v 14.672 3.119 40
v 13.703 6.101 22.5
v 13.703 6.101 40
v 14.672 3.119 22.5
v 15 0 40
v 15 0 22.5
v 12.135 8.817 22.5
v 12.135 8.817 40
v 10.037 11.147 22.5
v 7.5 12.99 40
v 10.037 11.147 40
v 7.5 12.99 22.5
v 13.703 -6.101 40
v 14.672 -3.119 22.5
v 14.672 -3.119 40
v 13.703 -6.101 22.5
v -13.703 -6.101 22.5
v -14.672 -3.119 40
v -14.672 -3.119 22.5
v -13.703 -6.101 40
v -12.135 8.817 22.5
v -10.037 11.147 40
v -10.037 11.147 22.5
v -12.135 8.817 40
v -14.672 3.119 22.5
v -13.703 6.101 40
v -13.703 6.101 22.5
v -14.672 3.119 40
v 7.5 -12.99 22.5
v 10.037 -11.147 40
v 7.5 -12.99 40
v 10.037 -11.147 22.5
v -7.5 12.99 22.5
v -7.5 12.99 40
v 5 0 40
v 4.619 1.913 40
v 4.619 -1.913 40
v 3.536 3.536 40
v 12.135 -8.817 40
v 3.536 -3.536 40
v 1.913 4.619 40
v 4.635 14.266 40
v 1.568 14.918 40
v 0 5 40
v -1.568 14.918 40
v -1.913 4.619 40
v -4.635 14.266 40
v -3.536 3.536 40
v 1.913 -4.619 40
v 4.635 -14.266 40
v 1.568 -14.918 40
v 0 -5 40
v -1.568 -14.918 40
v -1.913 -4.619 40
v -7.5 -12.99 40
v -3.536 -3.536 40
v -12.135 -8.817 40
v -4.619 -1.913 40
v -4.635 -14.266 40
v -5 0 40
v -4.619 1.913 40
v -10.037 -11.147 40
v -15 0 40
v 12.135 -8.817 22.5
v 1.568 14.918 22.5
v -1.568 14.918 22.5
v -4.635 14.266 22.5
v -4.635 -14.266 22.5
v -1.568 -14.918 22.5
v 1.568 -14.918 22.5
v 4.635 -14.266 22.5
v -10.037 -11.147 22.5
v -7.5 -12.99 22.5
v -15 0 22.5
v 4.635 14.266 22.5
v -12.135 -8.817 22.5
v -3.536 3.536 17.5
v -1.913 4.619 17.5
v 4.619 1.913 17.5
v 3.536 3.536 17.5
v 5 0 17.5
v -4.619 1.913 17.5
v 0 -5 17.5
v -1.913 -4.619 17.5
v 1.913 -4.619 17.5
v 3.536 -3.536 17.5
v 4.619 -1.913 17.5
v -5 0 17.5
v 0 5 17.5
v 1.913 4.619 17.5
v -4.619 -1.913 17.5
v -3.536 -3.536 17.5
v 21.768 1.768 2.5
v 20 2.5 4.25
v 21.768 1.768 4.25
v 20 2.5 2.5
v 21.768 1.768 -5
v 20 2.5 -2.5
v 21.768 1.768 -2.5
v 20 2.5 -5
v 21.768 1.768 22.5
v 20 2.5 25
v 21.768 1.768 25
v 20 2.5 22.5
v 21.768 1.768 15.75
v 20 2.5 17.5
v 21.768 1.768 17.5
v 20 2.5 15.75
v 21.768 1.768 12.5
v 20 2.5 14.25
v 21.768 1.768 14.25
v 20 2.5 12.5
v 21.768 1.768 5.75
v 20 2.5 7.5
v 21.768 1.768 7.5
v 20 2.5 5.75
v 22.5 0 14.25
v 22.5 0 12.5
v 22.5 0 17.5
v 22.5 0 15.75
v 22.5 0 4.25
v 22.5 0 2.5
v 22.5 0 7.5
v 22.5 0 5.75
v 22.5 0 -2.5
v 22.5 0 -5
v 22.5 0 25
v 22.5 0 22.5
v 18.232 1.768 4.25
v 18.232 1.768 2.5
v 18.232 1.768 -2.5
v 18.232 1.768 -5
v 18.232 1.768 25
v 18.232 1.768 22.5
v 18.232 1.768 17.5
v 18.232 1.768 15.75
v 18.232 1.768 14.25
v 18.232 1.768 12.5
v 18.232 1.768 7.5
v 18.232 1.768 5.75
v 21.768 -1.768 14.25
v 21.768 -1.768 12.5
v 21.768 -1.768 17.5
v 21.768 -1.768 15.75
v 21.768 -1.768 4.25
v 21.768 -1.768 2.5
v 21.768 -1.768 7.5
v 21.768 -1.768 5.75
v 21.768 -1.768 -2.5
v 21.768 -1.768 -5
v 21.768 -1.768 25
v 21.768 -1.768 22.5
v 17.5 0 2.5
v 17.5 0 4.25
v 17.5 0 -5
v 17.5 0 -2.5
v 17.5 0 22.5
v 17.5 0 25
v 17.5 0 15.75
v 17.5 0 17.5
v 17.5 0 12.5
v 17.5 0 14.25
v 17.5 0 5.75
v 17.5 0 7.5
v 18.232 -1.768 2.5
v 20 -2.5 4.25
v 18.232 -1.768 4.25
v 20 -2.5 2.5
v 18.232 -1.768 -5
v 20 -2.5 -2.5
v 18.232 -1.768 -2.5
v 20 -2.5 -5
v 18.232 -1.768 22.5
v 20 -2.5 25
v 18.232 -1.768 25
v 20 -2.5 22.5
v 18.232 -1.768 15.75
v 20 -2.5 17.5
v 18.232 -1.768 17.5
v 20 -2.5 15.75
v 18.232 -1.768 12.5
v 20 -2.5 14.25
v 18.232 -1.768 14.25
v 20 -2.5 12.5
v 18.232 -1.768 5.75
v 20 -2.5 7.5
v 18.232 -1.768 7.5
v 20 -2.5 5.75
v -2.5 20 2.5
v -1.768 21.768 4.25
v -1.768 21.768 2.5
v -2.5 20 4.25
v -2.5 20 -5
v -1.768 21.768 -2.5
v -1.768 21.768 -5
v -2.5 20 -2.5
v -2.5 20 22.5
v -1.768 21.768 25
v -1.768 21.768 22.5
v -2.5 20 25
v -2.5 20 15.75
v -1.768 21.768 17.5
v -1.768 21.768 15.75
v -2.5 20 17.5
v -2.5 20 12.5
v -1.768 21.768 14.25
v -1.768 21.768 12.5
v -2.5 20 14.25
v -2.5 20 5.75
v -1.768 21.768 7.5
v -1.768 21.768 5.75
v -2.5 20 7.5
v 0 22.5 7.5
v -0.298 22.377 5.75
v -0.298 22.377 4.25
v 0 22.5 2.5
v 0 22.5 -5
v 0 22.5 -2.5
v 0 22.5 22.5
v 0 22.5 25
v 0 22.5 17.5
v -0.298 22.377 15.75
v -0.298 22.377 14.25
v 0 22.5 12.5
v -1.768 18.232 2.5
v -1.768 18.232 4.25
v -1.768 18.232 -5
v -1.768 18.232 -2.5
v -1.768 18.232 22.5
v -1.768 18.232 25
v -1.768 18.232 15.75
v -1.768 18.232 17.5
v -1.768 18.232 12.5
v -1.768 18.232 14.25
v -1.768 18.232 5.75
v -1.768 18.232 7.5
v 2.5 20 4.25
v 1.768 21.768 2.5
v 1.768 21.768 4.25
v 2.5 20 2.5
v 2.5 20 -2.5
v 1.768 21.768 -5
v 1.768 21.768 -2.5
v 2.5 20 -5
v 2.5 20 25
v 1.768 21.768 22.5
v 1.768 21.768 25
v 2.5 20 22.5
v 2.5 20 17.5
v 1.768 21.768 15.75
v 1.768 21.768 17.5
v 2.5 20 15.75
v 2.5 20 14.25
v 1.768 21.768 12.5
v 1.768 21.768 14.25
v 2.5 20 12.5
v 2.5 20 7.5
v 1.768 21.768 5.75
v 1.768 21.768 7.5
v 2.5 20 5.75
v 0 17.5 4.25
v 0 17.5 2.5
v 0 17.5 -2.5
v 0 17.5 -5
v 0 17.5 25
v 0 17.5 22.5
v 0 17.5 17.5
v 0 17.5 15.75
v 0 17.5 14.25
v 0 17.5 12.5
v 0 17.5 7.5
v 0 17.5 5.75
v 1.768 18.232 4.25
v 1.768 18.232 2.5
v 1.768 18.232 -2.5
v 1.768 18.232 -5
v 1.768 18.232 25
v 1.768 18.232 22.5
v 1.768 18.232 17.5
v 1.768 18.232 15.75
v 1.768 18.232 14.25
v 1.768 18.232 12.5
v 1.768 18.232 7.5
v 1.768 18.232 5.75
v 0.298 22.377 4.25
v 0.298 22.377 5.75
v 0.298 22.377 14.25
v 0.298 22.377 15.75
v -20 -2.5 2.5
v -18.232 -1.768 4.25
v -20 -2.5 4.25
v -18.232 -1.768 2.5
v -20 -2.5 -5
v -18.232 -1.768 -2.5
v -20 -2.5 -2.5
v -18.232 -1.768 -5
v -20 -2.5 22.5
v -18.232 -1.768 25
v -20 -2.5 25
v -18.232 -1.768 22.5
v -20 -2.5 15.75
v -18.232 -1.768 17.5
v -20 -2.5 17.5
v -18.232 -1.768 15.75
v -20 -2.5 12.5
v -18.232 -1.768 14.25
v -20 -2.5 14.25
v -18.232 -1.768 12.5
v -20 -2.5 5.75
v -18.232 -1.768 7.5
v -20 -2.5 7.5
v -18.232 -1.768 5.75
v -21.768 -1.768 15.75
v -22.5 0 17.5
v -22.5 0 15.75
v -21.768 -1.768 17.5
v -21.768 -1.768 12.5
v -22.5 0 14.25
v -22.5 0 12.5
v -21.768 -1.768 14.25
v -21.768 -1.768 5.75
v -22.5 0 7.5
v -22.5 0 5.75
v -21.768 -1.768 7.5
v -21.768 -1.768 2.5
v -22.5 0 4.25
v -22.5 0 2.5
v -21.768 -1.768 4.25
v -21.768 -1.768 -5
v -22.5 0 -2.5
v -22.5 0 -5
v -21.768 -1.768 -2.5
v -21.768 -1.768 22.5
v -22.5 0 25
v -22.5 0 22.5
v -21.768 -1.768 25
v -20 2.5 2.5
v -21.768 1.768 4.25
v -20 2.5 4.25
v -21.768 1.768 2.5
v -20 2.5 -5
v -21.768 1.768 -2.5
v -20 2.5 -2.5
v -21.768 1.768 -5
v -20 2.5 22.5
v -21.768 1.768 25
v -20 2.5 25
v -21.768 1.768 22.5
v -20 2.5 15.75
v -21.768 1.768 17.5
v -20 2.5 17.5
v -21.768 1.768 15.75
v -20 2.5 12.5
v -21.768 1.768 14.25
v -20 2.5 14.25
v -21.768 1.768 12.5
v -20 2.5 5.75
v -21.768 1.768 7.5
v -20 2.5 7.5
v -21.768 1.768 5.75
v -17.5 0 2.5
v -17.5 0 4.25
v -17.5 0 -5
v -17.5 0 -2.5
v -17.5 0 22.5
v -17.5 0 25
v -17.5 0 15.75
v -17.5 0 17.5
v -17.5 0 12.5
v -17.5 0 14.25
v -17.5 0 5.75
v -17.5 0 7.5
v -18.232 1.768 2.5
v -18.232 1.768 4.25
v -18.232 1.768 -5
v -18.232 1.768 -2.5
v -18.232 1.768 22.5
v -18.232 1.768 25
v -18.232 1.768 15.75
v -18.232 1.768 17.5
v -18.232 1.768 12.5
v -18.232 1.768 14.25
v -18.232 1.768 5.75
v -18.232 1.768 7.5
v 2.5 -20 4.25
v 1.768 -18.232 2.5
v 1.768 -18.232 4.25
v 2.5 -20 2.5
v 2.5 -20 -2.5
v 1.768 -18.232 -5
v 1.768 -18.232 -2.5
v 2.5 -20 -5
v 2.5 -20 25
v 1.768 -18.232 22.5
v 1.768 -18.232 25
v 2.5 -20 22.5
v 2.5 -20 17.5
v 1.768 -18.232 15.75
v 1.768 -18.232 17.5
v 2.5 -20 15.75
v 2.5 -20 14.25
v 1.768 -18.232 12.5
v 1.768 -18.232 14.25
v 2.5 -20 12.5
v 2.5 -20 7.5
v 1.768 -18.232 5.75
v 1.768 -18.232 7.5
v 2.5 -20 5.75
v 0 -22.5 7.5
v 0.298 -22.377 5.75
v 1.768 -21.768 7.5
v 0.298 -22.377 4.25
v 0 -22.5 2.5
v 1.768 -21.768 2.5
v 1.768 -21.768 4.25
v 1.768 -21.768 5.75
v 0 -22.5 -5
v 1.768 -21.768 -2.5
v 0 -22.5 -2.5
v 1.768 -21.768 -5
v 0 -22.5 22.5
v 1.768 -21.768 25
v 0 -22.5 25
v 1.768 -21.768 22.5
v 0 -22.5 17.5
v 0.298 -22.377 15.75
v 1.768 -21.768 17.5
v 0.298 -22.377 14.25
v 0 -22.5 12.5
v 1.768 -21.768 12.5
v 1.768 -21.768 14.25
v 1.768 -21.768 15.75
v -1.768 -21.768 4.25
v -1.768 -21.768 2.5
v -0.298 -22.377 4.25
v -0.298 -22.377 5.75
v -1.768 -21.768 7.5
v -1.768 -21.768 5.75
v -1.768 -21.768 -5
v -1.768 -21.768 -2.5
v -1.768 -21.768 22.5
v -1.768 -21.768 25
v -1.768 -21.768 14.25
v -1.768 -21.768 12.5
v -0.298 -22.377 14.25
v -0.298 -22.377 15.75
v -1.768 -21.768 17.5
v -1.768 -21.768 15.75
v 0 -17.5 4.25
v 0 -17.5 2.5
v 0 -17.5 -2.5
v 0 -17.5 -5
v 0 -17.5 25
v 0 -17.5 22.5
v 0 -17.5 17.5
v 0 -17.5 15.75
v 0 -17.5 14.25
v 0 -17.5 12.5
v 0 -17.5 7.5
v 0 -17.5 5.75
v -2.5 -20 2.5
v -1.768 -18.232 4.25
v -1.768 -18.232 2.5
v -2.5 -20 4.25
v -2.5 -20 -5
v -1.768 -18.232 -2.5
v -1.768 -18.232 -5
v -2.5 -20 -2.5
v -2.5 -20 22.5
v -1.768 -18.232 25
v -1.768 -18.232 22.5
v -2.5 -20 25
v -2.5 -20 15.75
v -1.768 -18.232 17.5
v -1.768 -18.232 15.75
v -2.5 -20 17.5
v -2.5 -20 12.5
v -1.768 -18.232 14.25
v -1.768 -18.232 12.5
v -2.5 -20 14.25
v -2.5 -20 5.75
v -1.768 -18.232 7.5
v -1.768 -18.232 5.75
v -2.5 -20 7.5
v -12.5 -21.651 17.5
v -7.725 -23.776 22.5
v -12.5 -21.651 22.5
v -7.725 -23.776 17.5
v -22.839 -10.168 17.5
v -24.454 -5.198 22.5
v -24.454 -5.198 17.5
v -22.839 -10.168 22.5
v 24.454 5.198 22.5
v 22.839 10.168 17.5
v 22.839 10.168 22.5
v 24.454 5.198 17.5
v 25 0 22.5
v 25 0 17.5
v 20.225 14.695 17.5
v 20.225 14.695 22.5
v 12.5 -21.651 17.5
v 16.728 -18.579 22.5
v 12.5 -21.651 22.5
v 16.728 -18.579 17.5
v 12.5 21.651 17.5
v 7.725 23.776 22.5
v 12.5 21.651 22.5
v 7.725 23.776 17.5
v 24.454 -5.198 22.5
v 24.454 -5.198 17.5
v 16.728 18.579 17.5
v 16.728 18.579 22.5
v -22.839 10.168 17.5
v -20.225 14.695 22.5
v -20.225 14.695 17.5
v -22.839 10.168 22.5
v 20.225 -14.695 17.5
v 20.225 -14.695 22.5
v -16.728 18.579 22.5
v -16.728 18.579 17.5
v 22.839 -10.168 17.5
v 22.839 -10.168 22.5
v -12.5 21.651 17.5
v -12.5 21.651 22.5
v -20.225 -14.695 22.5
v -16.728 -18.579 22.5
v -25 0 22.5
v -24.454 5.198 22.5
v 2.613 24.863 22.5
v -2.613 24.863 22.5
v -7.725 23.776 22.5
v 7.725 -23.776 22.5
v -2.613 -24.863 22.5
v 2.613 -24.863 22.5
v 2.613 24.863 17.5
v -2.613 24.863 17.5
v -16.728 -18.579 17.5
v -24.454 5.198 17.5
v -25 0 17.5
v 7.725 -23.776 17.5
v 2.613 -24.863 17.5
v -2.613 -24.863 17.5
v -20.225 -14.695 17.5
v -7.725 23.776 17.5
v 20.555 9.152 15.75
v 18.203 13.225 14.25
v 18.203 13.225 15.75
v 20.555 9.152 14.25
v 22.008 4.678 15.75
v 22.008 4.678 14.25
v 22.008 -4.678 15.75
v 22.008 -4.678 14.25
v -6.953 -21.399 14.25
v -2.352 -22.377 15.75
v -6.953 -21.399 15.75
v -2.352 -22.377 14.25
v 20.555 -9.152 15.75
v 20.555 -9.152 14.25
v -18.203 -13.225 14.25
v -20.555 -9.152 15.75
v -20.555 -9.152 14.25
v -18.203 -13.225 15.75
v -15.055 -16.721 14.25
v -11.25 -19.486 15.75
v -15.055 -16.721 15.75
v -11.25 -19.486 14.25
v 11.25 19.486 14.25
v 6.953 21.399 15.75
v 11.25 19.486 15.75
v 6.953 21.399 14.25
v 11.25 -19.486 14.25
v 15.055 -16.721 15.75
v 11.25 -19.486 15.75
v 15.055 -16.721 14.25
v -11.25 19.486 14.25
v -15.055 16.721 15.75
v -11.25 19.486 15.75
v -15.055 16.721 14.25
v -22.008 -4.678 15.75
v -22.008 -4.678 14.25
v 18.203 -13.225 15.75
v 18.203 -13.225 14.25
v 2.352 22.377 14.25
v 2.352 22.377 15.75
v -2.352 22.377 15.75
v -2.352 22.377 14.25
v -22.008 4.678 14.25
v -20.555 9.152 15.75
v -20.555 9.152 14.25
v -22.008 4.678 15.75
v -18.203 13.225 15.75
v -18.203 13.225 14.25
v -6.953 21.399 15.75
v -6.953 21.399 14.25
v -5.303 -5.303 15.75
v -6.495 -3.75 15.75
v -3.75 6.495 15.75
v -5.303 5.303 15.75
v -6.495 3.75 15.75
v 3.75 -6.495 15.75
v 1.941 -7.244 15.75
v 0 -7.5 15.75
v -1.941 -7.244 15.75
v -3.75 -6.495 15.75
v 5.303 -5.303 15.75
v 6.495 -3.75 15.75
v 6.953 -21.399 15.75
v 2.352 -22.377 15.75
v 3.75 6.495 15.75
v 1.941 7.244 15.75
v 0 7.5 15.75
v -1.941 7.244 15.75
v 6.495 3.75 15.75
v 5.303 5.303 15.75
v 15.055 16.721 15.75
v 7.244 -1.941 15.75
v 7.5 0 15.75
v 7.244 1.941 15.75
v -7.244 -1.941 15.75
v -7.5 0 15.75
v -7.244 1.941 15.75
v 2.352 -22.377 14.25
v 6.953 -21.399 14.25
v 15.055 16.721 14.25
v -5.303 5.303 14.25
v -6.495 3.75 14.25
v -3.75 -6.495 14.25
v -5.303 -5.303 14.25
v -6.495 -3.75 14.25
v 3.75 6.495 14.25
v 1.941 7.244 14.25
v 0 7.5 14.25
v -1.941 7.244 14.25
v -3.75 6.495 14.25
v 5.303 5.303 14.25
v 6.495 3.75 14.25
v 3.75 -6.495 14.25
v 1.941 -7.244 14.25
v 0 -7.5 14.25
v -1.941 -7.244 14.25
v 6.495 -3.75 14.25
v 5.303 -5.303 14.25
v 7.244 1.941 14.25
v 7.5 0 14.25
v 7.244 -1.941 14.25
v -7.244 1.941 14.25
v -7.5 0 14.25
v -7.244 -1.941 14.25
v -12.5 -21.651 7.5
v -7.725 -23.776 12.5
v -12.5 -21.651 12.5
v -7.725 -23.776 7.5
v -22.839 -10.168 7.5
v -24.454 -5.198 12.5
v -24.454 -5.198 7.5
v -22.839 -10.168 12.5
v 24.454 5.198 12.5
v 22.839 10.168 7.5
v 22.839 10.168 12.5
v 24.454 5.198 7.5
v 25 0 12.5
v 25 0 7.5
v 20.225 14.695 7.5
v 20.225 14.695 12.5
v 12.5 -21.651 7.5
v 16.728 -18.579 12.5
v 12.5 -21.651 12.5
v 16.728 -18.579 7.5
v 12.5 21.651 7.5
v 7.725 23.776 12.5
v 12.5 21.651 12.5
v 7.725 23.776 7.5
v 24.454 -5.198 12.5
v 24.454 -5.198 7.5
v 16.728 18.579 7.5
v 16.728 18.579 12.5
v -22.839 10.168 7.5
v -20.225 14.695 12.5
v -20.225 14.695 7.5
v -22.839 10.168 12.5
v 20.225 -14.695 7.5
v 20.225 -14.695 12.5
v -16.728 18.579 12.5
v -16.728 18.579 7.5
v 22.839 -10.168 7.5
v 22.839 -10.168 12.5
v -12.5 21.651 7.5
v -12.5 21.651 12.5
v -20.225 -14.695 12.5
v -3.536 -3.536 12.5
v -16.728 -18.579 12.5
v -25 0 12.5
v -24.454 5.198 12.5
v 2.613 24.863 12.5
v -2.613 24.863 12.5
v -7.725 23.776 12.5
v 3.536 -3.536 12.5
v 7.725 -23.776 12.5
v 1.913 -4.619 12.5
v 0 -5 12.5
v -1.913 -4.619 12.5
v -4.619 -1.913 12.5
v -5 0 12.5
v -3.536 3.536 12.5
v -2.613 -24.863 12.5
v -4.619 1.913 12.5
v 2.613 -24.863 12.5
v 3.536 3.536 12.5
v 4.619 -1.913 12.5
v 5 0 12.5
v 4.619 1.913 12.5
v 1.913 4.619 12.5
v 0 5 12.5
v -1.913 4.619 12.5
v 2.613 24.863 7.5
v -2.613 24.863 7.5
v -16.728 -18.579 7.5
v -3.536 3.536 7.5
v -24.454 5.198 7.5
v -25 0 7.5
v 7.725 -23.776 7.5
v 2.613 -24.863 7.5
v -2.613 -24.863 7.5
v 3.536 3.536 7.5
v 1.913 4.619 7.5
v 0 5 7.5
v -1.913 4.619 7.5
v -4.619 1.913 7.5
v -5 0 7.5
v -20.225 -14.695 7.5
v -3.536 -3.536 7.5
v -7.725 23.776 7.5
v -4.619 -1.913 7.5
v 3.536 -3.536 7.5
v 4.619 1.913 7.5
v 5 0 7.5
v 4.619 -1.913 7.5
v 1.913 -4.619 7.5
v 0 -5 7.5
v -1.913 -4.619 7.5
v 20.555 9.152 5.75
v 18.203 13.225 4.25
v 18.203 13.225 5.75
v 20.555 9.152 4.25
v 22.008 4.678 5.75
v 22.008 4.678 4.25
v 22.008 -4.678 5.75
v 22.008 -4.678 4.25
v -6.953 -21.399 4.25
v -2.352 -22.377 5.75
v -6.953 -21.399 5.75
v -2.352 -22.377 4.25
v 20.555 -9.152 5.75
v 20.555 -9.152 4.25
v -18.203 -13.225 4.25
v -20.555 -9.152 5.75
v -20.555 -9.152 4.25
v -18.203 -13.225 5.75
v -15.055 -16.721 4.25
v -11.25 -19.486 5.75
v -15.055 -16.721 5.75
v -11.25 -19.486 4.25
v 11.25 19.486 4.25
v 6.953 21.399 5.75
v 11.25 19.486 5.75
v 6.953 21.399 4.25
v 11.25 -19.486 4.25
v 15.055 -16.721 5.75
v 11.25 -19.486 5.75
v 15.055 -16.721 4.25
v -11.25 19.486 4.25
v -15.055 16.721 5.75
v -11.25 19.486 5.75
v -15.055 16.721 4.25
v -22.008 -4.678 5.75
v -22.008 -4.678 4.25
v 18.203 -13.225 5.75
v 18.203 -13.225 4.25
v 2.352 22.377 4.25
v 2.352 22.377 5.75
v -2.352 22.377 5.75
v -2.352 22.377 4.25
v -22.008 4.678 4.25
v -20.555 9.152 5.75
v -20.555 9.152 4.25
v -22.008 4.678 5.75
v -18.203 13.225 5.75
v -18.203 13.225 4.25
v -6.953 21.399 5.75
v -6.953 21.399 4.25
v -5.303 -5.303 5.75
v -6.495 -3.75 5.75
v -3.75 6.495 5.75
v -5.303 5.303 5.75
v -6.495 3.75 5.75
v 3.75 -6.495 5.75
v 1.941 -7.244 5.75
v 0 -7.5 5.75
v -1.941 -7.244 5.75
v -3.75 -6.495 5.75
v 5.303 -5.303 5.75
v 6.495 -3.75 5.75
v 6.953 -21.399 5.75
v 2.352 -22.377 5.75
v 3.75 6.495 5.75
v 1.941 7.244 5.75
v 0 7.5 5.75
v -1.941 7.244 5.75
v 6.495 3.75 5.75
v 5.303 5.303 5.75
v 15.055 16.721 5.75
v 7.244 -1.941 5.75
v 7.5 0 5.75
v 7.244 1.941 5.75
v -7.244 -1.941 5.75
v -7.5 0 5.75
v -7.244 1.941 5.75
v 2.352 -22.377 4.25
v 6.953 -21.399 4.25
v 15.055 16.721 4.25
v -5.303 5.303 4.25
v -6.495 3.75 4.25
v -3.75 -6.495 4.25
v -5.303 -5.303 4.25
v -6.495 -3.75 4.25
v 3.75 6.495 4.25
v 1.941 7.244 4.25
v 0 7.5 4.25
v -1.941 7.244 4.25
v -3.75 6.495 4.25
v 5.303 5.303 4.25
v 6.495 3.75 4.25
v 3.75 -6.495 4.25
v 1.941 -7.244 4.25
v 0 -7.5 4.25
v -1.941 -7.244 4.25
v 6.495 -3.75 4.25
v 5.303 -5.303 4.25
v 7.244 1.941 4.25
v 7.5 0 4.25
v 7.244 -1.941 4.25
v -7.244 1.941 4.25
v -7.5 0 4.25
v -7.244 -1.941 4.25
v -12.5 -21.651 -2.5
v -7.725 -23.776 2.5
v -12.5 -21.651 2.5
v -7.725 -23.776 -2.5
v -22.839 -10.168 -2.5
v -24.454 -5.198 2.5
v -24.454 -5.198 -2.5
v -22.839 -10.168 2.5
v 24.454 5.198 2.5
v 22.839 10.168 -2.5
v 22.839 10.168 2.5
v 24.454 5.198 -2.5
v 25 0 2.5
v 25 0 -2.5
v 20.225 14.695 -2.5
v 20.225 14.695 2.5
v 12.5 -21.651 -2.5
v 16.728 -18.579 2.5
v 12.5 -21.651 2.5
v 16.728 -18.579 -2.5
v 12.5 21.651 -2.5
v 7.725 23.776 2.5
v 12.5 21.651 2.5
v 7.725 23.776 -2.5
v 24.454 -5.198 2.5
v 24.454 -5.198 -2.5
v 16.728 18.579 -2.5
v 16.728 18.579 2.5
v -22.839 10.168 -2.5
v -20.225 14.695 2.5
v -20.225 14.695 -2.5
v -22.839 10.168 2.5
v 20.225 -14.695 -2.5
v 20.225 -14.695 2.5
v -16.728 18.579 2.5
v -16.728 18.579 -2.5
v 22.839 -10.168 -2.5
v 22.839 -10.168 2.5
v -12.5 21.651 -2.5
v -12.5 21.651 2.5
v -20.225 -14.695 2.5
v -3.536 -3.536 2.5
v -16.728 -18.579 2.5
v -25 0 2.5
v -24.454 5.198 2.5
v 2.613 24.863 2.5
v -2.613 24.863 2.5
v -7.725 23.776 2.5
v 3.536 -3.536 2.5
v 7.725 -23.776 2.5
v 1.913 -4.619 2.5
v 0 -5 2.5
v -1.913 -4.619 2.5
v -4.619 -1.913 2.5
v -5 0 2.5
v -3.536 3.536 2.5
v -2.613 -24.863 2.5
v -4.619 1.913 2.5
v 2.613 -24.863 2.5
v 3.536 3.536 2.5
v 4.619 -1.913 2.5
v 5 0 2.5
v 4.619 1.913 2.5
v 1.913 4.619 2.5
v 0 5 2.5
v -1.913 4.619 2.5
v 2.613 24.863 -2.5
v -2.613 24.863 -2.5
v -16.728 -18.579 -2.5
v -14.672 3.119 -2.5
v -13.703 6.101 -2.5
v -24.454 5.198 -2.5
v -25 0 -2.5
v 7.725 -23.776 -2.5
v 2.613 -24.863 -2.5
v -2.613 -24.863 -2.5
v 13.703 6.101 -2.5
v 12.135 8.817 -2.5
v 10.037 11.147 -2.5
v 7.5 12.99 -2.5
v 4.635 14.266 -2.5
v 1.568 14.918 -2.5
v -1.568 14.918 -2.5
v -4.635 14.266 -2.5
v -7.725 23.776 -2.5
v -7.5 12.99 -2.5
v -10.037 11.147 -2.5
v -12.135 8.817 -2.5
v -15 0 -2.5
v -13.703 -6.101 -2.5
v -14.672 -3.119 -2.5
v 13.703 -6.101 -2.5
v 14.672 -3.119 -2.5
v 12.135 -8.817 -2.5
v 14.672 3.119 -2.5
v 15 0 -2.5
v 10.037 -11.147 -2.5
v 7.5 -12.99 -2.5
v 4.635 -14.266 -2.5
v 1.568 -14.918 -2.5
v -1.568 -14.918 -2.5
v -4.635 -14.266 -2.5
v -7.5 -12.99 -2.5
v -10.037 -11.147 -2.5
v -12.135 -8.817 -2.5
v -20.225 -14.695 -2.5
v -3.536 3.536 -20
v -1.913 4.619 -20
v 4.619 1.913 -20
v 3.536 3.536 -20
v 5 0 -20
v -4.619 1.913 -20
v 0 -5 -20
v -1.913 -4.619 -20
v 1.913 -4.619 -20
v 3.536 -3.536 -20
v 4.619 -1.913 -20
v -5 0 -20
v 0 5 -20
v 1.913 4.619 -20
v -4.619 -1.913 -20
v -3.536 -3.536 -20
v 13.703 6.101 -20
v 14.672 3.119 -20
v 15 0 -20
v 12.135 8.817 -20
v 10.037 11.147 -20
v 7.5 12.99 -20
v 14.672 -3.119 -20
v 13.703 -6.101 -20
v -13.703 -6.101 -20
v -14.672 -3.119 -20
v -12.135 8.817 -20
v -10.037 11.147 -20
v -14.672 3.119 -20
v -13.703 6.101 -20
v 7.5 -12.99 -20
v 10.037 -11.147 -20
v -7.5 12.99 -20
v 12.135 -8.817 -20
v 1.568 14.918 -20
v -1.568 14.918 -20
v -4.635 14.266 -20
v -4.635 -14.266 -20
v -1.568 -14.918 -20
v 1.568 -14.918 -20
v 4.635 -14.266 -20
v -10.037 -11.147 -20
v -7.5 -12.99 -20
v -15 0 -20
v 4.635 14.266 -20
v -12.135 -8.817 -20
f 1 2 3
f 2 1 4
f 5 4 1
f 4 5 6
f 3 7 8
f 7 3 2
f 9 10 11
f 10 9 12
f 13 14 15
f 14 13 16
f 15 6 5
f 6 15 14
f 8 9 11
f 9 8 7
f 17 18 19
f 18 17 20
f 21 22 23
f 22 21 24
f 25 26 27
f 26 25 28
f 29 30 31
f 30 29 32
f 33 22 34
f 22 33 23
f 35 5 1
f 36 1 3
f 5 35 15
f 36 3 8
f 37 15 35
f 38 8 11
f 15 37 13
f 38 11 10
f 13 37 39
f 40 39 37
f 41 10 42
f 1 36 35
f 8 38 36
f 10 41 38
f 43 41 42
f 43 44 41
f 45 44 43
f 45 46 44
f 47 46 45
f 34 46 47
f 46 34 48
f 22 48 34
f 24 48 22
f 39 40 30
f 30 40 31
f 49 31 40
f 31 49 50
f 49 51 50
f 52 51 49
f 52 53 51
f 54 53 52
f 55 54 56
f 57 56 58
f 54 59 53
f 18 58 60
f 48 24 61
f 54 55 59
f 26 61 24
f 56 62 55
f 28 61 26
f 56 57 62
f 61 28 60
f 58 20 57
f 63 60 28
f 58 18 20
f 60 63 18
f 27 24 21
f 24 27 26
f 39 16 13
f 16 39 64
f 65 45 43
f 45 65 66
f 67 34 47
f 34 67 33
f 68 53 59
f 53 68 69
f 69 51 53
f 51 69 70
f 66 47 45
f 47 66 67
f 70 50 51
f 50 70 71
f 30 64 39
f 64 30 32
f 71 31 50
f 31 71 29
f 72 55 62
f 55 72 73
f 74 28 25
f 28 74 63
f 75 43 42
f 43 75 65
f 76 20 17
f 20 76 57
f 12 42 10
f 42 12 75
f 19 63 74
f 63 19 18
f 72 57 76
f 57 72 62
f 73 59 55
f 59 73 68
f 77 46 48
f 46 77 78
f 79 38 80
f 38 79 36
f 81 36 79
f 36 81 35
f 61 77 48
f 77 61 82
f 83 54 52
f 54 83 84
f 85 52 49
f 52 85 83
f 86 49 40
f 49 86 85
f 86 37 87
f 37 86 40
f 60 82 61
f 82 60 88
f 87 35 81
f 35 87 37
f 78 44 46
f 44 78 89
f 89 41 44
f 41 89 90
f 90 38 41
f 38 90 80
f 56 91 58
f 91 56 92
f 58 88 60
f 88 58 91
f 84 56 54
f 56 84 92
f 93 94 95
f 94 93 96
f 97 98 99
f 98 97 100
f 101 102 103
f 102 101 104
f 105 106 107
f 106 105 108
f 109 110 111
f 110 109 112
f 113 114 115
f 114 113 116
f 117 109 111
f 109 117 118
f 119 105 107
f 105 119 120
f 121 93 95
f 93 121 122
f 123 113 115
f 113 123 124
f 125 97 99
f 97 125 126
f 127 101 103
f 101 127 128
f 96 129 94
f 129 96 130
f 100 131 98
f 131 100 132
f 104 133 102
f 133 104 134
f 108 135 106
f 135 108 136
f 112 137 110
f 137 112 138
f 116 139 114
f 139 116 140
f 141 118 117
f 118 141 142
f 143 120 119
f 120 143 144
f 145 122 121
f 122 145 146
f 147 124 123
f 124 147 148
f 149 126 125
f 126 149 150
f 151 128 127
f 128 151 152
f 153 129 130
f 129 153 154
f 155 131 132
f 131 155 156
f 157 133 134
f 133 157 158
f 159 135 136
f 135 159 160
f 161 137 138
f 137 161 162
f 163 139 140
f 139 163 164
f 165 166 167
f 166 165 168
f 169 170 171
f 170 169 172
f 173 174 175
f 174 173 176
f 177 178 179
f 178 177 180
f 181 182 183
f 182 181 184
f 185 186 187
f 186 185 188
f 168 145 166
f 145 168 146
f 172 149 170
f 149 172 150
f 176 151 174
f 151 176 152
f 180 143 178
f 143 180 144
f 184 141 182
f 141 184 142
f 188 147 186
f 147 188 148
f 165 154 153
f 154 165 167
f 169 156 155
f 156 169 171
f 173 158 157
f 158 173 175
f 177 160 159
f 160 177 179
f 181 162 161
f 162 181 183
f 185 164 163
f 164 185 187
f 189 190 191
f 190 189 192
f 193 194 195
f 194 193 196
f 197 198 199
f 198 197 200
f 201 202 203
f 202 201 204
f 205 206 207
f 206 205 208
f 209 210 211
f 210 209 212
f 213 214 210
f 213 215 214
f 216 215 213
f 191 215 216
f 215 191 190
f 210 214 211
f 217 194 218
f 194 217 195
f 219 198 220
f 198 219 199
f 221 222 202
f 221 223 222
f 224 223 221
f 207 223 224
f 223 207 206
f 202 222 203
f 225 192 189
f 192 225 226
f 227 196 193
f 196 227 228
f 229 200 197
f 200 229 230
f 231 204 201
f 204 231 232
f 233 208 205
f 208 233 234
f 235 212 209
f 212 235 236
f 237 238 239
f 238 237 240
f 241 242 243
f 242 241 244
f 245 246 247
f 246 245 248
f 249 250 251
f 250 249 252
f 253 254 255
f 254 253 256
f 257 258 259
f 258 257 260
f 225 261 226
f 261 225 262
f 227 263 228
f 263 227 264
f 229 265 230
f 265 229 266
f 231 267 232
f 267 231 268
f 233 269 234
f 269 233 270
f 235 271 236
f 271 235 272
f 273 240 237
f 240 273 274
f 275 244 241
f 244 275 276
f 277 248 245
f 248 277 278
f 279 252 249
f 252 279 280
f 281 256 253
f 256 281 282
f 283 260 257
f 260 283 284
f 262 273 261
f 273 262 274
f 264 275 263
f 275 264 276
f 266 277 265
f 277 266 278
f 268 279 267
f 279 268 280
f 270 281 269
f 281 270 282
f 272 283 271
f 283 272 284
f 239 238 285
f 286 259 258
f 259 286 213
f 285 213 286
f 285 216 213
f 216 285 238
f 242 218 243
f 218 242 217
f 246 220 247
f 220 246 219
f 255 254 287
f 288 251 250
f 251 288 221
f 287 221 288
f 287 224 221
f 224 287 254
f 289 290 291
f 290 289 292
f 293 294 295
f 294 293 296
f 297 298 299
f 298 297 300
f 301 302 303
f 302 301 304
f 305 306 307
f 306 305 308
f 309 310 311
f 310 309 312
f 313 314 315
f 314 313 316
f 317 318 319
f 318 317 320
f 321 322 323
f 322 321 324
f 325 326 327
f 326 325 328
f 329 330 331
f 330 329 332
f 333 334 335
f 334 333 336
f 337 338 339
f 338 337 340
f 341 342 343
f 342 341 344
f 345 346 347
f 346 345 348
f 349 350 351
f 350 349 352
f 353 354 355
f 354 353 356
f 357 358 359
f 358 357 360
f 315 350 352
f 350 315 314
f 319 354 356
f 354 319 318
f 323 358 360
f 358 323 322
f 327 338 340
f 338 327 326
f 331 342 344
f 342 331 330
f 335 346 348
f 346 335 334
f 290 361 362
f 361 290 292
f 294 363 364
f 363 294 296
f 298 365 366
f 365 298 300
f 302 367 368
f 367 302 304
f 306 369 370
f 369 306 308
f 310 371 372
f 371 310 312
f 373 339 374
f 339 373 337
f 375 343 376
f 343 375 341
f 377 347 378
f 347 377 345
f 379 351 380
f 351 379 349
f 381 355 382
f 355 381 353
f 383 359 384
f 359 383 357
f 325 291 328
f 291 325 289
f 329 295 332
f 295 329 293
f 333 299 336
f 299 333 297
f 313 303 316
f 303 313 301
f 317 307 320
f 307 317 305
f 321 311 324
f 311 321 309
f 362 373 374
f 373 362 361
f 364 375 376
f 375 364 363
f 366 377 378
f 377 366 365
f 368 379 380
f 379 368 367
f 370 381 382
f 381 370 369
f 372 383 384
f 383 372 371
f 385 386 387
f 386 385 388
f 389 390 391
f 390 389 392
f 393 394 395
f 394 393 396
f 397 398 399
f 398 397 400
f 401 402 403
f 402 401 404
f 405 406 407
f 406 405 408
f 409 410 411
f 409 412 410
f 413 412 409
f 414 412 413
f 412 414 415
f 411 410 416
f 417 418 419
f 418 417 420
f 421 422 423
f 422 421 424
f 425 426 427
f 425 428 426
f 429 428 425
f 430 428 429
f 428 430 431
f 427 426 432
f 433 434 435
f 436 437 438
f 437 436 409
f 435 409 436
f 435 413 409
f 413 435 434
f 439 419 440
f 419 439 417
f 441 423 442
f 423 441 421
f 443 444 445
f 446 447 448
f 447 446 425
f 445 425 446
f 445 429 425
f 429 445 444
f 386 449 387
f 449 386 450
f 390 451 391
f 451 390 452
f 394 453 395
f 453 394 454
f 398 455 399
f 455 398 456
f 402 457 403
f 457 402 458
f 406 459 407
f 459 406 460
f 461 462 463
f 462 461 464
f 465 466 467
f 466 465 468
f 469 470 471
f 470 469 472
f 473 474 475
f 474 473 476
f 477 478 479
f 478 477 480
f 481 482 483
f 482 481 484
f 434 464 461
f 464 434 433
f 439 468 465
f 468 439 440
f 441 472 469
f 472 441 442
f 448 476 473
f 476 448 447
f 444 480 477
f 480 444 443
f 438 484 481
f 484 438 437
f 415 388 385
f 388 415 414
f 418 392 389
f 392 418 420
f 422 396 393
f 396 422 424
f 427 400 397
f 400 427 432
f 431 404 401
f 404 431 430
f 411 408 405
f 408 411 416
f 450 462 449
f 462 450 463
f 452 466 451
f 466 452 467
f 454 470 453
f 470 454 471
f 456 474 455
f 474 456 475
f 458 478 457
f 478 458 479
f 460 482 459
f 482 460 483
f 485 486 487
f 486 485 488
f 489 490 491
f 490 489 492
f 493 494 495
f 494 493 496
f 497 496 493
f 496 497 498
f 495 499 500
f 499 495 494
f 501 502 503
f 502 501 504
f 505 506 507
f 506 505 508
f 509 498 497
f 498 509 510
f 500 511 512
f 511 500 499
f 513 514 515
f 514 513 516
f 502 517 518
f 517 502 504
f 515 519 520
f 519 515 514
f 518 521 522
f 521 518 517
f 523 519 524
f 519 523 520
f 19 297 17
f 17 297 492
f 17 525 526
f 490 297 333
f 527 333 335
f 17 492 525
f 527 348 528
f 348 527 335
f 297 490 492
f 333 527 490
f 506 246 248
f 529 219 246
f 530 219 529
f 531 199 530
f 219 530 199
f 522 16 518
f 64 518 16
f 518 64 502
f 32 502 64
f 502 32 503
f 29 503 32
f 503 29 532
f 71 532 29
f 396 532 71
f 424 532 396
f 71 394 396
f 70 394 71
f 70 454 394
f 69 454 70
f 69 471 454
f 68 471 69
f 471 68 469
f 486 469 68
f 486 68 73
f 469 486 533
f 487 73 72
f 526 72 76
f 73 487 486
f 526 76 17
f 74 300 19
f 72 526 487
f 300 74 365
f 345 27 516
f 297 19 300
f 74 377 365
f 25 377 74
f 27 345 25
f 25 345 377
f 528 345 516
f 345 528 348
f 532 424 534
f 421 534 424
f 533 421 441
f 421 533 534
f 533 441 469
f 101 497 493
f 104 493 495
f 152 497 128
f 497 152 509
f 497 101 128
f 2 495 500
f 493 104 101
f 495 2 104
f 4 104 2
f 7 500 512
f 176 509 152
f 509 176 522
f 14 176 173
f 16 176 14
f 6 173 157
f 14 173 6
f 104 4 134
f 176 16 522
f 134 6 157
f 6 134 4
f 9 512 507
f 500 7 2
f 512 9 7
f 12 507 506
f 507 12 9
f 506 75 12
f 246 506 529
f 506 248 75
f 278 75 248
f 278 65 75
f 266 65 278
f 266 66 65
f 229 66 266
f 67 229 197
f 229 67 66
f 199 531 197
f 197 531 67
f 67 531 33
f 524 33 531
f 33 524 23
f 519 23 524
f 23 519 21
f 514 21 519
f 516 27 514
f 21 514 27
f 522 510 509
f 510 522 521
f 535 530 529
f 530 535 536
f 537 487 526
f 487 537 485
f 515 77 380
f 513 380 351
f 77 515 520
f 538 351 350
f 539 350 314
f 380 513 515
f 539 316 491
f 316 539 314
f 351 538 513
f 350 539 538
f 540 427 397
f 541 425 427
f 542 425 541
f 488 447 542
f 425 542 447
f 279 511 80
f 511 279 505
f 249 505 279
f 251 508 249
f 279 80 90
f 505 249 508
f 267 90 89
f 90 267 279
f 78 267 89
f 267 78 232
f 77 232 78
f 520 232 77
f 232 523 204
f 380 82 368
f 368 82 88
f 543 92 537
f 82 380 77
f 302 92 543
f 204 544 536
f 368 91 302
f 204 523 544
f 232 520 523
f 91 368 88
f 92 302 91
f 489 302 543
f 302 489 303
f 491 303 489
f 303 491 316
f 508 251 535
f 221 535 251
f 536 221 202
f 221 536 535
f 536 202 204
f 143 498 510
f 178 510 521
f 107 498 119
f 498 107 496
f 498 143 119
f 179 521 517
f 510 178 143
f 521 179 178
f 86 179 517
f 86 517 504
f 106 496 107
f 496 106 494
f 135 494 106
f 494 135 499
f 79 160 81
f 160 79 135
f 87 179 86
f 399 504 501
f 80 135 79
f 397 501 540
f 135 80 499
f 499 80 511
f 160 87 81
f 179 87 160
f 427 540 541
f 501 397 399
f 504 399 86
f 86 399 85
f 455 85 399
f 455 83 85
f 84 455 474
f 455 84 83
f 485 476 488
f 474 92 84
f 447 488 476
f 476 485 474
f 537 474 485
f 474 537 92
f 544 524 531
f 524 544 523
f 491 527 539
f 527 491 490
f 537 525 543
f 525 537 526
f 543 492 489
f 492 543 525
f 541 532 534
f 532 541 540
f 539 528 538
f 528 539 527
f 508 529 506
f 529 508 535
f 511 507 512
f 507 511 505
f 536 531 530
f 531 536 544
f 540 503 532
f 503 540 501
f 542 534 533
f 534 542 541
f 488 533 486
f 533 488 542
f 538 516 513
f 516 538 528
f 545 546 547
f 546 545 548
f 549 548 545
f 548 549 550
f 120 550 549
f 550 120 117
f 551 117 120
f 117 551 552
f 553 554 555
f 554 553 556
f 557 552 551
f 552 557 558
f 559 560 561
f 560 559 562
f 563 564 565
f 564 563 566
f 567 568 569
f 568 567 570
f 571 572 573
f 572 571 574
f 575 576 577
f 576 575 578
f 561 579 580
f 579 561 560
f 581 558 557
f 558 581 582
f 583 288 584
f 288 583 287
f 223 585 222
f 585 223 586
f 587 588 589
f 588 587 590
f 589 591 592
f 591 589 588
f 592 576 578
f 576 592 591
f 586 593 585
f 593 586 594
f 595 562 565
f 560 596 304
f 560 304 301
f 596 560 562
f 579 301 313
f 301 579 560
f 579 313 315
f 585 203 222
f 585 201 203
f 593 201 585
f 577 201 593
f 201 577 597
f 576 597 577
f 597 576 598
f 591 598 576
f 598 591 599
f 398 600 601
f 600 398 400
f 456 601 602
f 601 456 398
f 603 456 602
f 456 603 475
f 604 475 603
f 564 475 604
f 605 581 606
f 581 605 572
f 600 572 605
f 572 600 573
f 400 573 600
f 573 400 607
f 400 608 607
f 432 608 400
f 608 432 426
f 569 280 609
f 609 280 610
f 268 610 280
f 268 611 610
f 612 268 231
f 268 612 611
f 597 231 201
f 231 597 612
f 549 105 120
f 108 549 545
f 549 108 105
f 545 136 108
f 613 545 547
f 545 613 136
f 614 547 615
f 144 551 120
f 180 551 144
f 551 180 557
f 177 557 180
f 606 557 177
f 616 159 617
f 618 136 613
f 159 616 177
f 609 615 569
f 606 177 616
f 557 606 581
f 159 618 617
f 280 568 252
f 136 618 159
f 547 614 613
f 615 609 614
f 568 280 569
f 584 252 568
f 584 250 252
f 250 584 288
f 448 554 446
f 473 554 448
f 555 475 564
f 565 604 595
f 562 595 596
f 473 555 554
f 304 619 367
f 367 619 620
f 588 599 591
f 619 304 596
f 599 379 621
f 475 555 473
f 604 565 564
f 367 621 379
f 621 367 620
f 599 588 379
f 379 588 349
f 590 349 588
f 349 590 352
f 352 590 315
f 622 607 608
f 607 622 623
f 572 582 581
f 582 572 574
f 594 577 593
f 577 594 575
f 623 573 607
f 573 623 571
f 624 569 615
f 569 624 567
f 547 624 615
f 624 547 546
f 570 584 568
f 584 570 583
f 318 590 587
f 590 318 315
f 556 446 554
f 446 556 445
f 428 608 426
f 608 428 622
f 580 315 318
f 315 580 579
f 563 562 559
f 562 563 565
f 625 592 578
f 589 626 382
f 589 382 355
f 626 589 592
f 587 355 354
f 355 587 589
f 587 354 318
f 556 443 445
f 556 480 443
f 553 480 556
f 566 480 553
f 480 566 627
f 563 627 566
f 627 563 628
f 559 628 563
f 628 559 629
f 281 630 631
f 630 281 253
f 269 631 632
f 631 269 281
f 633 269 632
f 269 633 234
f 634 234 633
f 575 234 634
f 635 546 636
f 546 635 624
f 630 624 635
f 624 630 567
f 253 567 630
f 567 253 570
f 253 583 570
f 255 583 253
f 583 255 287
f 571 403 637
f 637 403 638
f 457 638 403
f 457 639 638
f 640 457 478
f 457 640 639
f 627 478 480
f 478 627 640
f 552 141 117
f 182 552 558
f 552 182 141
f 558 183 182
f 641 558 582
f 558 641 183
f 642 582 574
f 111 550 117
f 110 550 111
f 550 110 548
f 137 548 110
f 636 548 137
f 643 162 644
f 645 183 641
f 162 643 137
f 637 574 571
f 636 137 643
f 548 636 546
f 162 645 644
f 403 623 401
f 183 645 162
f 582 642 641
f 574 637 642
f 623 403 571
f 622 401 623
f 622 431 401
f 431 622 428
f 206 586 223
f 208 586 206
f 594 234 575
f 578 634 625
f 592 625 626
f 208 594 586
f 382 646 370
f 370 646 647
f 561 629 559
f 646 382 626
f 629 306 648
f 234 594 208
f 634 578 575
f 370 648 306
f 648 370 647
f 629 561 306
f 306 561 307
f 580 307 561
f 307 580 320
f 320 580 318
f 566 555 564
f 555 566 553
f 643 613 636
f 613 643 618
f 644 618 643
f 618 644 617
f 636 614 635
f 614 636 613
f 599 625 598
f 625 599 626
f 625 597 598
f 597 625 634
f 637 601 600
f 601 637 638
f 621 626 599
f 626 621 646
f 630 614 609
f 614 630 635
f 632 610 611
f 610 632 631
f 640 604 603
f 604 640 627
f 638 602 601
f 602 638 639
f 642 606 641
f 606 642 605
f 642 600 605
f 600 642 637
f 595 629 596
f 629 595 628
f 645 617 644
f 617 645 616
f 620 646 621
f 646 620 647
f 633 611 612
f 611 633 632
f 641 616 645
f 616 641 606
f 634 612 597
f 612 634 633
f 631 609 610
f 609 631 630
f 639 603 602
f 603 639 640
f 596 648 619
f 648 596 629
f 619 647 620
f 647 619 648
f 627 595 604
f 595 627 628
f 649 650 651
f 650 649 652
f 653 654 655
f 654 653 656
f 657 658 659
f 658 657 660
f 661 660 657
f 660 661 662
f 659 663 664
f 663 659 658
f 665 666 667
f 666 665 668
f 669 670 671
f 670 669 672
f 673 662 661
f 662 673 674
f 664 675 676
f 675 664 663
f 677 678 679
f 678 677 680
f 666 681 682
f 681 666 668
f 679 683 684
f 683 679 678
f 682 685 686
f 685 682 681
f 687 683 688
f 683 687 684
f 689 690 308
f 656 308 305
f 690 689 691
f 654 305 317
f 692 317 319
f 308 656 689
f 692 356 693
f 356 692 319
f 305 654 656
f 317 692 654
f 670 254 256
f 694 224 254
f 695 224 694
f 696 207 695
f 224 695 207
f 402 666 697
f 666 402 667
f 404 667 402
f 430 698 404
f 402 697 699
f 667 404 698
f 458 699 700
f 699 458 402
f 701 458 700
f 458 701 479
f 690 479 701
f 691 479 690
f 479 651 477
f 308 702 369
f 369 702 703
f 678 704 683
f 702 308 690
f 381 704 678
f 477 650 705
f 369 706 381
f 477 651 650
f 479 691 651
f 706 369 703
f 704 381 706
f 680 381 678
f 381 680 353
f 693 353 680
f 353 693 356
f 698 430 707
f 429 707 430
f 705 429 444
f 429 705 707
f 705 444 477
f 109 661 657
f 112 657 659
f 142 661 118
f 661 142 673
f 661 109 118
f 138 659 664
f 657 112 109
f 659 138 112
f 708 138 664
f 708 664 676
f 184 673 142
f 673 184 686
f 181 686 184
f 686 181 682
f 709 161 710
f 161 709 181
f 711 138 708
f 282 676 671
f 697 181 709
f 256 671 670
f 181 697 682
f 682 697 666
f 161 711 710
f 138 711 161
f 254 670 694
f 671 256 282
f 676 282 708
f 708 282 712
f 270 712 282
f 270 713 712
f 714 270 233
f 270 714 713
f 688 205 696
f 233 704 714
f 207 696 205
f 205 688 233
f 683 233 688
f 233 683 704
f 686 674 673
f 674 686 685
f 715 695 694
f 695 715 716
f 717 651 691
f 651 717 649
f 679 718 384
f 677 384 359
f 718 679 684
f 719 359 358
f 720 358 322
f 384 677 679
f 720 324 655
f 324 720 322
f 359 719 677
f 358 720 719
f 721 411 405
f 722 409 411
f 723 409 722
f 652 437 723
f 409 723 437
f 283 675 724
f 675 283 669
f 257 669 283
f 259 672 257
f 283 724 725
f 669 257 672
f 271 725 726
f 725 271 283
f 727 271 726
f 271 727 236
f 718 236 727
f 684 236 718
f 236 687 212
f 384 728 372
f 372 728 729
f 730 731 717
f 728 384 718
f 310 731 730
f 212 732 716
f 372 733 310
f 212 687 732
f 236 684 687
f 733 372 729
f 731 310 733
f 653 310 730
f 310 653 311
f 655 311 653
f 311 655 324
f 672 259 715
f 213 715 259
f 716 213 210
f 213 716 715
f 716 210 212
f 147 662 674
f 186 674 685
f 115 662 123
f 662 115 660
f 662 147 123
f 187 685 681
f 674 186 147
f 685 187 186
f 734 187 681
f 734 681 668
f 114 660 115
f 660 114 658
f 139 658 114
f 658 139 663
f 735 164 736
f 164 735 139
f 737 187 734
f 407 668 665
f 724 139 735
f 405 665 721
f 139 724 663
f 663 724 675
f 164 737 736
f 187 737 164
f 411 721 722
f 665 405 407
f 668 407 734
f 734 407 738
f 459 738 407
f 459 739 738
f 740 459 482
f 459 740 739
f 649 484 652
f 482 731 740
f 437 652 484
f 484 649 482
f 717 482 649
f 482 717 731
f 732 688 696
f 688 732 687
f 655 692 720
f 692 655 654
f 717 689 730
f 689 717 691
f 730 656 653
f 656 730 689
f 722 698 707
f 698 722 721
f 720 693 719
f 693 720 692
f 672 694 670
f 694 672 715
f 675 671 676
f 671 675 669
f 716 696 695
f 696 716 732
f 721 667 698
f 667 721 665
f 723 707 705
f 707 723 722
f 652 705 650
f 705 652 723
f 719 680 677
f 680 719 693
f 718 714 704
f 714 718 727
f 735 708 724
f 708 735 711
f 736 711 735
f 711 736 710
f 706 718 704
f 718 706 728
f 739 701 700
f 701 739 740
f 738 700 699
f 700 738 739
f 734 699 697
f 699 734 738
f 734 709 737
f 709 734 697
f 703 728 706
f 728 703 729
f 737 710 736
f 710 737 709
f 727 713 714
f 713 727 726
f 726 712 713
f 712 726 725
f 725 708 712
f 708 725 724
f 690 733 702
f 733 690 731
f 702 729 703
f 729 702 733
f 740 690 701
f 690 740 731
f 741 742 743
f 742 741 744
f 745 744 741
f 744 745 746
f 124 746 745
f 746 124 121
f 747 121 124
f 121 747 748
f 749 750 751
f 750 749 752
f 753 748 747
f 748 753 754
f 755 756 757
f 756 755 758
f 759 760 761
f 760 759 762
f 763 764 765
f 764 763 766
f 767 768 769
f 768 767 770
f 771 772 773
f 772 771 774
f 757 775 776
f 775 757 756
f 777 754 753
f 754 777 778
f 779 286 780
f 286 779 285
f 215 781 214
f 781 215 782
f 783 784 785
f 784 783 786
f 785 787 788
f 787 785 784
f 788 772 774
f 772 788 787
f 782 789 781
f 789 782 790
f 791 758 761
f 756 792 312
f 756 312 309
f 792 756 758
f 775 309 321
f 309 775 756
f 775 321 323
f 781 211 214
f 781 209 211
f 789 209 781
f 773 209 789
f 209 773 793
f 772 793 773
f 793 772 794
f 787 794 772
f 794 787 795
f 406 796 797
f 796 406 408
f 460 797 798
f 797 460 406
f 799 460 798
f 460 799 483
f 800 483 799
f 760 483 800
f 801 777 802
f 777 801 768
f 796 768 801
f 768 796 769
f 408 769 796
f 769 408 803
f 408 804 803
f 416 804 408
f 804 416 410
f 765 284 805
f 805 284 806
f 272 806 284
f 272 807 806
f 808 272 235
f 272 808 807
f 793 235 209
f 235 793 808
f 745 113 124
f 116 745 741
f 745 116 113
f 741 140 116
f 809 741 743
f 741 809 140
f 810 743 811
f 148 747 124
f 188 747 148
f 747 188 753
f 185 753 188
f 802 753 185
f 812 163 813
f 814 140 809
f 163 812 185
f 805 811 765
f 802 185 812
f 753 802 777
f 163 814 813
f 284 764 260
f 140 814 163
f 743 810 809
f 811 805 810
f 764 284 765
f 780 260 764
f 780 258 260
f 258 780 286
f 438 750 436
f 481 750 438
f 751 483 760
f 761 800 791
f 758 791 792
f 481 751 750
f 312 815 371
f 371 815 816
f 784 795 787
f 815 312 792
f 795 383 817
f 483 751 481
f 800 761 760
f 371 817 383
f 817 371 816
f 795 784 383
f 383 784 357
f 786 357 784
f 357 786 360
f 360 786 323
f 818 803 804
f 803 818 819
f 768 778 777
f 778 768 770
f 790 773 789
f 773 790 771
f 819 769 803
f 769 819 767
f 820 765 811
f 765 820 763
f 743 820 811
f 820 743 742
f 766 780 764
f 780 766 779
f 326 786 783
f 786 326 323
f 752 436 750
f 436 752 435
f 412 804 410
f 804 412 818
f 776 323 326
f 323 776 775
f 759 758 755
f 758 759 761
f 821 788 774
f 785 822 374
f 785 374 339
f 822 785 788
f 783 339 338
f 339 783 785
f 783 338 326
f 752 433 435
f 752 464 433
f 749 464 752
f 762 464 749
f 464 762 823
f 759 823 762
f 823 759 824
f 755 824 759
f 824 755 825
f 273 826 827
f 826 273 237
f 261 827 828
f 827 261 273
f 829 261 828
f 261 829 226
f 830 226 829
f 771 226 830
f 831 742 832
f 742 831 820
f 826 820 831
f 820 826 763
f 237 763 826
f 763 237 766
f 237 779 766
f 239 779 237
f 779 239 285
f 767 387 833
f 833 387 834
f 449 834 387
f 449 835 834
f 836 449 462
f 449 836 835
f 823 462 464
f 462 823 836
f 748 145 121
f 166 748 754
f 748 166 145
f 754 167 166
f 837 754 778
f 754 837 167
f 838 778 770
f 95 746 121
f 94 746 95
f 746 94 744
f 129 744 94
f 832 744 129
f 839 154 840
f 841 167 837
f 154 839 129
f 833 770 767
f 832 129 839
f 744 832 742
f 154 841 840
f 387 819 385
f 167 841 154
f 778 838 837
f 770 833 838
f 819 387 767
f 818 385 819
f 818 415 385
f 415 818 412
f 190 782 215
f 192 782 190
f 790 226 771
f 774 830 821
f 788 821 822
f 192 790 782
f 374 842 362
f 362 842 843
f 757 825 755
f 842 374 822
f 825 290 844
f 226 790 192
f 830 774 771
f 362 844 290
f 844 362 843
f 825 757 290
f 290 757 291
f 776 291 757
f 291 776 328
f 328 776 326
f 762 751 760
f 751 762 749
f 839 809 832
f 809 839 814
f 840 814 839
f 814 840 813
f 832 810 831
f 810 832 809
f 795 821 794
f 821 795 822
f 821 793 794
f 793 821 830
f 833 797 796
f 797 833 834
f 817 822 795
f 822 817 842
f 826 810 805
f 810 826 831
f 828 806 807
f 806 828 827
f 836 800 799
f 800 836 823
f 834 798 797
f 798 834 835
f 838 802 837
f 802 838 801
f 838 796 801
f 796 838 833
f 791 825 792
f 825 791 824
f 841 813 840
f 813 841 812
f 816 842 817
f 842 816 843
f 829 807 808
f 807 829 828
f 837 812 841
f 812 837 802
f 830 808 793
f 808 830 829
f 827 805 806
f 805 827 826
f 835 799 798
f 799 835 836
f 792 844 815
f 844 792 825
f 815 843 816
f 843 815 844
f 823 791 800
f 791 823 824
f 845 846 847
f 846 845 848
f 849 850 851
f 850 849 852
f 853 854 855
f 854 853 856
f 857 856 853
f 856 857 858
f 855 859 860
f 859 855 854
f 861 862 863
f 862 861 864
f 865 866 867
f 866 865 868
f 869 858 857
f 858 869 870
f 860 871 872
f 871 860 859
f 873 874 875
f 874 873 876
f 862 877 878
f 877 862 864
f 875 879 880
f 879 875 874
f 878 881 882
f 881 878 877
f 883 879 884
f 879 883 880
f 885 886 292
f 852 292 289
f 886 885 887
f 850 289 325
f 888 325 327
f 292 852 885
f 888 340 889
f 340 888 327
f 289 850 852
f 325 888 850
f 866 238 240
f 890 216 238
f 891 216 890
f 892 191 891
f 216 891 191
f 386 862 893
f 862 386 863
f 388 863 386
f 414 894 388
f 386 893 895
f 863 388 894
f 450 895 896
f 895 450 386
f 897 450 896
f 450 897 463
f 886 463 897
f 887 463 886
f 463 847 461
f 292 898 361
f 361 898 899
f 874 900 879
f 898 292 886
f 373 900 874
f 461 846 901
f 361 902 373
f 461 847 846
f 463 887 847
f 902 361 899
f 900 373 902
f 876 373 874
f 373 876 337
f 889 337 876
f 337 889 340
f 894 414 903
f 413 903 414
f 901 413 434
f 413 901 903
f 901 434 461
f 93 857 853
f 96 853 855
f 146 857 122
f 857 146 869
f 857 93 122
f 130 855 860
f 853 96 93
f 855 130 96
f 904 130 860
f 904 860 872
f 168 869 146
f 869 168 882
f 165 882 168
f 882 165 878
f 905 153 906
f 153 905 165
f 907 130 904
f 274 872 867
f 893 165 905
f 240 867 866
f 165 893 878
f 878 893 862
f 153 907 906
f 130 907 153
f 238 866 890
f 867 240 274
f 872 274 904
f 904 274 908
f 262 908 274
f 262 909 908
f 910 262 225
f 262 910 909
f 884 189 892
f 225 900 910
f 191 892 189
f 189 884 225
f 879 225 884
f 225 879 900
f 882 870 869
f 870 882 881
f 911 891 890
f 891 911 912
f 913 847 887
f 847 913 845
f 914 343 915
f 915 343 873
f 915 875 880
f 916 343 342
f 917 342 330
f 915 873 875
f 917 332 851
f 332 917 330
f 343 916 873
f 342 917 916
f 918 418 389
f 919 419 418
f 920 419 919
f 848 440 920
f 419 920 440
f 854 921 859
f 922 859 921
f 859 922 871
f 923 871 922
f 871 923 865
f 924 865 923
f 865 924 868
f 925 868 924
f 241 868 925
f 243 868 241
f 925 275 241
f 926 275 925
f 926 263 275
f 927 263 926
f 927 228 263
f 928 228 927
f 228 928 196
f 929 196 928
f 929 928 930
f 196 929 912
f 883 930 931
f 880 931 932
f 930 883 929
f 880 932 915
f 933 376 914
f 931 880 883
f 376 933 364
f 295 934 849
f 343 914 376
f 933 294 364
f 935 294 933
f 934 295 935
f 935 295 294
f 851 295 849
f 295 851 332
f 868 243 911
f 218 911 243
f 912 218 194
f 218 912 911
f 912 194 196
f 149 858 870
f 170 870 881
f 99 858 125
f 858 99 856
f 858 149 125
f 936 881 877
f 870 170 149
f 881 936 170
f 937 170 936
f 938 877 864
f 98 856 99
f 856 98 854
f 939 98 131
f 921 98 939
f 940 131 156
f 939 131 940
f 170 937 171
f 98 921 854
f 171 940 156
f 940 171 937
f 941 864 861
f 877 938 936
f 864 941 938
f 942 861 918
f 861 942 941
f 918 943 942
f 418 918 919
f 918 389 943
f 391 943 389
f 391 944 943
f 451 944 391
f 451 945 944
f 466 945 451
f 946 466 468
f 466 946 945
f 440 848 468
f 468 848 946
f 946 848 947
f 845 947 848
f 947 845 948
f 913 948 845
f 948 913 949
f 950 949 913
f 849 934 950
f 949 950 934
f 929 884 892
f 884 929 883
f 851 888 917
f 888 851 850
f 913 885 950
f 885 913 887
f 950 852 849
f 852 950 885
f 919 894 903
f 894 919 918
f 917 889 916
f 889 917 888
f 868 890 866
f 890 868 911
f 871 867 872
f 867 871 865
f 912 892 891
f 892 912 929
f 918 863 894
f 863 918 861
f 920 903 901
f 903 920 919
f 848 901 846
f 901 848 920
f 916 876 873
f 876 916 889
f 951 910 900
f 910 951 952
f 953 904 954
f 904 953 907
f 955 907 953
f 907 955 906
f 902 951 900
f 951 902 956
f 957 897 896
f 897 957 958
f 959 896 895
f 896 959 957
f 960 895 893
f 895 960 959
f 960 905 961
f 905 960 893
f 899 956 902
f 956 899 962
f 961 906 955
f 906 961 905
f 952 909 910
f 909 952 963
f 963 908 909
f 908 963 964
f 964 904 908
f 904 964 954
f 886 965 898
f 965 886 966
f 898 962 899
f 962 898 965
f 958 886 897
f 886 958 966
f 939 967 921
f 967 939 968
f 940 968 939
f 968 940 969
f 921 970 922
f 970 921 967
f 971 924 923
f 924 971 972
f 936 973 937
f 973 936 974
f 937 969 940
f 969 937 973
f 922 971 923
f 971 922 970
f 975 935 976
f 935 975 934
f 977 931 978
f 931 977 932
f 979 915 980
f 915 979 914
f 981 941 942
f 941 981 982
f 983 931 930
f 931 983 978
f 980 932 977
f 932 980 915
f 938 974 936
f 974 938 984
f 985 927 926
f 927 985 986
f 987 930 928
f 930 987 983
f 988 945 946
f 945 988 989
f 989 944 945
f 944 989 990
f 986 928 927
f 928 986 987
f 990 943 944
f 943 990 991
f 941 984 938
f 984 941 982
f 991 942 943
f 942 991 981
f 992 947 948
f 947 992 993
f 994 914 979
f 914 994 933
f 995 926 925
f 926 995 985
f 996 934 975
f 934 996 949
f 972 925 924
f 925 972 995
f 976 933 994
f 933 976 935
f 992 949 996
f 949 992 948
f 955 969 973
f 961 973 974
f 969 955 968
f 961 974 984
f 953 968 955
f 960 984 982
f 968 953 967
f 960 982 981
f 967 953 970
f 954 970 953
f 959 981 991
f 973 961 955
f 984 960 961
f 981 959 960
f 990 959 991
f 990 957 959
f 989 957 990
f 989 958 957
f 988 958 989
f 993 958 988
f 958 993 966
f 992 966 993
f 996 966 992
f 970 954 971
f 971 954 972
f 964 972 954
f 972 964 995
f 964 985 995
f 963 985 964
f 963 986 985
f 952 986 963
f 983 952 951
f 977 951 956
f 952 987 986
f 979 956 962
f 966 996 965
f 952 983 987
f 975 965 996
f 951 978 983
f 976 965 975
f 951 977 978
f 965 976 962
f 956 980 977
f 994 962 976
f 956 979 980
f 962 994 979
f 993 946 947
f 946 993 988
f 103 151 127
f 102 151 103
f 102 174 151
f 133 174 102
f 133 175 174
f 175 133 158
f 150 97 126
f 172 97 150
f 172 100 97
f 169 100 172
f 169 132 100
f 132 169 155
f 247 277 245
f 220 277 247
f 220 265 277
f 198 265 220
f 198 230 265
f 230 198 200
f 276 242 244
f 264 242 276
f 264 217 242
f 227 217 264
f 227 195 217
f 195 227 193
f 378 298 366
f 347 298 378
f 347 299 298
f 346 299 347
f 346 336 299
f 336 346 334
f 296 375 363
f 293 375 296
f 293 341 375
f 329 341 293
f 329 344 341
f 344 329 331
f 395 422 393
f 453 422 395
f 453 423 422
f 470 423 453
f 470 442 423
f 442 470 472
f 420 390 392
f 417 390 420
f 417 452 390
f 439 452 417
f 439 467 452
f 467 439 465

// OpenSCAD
// Parameters
shaft_diameter = 10;
flange_diameter = 50;
flange_thickness = 5;
spacer_thickness = 1.5; // Reduced thickness to match the original model
bolt_diameter = 5;
bolt_length = 20;
nut_size = 8;
nut_thickness = 4;
spacing = 10;

// Function to create a cylindrical component with a central bore
module craft() {
    difference() {
        cylinder(h = 20, d = 30, center = true);
        cylinder(h = 25, d = shaft_diameter, center = true);
    }
}

// Function to create a flange plate with bolt holes
module flange_plate() {
    difference() {
        cylinder(h = flange_thickness, d = flange_diameter, center = true);
        cylinder(h = flange_thickness + 2, d = shaft_diameter, center = true);
        for (i = [0:3]) {
            rotate([0, 0, i * 90])
                translate([flange_diameter / 2.5, 0, 0])
                cylinder(h = flange_thickness + 2, d = bolt_diameter, center = true);
        }
    }
}

// Function to create a thinner spacer ring
module spacer_ring() {
    difference() {
        cylinder(h = spacer_thickness, d = flange_diameter - 5, center = true);
        cylinder(h = spacer_thickness + 2, d = shaft_diameter + 5, center = true);
    }
}

// Function to create a bolt
module bolt() {
    translate([0, 0, -bolt_length / 2]) cylinder(h = bolt_length, d = bolt_diameter, center = false);
}

// Function to create a nut
module nut() {
    translate([0, 0, -nut_thickness / 2]) cylinder(h = nut_thickness, d = nut_size, $fn = 6, center = false);
}

// Assembly of the coupling
module coupling() {
    translate([0, 0, spacing * 3]) craft(); // Input craft
    translate([0, 0, spacing * 2]) flange_plate(); // First flange plate
    translate([0, 0, spacing * 1.5]) spacer_ring(); // First spacer ring
    translate([0, 0, spacing]) flange_plate(); // Second flange plate
    translate([0, 0, spacing * 0.5]) spacer_ring(); // Second spacer ring
    translate([0, 0, 0]) flange_plate(); // Third flange plate
    translate([0, 0, -spacing]) craft(); // Output craft

    // Bolts and nuts
    for (i = [0:3]) {
        rotate([0, 0, i * 90])
            translate([flange_diameter / 2.5, 0, spacing * 1.5])
            bolt();
        rotate([0, 0, i * 90])
            translate([flange_diameter / 2.5, 0, spacing * 2])
            nut();
        rotate([0, 0, i * 90])
            translate([flange_diameter / 2.5, 0, spacing * 0.5])
            bolt();
        rotate([0, 0, i * 90])
            translate([flange_diameter / 2.5, 0, 0])
            nut();
    }
}

// Render the coupling
coupling();
